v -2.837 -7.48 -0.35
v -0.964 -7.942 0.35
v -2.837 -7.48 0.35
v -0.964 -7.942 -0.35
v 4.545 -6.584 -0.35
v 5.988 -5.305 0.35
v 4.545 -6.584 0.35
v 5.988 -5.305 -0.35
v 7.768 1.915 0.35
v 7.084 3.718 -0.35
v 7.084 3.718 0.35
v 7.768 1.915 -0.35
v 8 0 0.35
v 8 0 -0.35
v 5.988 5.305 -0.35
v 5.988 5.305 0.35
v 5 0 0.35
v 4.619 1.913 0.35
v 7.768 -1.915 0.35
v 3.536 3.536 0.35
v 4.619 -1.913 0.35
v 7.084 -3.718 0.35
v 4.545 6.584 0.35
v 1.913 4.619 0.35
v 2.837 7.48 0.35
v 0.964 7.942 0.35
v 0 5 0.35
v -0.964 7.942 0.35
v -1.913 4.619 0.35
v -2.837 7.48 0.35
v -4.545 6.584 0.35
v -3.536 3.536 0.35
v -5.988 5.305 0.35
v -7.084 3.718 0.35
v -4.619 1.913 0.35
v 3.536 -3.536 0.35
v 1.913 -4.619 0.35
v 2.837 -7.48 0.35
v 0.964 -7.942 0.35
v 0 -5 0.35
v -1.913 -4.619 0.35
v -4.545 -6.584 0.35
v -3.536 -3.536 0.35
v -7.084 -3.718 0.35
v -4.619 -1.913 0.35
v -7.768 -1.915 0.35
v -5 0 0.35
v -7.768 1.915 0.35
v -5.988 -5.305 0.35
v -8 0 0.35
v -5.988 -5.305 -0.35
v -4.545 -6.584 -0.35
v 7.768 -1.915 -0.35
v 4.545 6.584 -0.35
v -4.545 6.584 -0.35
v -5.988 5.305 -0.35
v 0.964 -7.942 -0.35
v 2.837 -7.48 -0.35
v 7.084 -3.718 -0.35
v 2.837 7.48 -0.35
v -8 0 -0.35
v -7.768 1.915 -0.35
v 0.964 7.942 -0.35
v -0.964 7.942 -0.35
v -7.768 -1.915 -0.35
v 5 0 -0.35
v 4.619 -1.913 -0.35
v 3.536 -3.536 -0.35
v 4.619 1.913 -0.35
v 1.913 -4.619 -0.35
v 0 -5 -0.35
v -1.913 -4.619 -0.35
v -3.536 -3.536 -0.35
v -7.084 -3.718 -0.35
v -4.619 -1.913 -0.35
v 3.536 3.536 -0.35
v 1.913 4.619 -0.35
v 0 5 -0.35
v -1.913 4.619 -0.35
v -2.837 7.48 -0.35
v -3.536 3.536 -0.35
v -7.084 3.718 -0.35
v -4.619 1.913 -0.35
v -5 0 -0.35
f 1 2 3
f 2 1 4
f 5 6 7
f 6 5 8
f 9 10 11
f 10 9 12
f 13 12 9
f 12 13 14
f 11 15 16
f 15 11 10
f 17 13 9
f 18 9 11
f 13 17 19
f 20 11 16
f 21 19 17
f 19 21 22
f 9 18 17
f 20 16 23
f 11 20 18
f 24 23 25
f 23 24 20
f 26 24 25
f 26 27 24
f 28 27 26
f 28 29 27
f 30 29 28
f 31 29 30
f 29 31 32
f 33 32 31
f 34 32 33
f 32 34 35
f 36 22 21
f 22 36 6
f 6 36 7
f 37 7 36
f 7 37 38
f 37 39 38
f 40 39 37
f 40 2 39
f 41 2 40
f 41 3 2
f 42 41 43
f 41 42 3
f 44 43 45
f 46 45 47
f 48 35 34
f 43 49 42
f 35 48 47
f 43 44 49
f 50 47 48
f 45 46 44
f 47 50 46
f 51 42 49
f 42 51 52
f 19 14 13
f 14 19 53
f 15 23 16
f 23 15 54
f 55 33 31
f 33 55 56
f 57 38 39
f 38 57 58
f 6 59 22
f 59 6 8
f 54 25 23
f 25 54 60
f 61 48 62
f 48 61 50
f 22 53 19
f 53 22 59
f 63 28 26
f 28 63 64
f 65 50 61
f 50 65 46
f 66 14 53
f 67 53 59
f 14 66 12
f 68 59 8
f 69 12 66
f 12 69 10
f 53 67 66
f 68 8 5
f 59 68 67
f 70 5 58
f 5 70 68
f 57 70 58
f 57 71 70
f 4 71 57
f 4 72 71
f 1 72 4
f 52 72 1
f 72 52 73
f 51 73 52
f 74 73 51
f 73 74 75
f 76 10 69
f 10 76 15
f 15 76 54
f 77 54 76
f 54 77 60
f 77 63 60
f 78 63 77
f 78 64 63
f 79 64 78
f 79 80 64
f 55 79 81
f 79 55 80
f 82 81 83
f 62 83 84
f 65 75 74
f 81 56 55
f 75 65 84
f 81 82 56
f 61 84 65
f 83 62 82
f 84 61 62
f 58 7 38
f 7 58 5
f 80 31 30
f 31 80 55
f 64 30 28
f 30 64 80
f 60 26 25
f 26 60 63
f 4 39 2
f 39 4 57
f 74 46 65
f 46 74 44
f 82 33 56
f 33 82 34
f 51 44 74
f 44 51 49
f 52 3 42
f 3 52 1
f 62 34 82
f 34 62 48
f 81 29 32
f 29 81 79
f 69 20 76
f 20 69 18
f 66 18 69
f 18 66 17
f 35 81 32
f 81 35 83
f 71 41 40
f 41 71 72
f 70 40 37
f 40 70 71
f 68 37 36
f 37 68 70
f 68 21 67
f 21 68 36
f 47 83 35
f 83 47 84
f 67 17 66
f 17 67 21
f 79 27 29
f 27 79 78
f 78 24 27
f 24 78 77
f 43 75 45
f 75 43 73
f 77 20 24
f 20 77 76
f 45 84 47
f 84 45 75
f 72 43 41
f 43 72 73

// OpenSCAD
// Part A2: thin spacer ring.
// SPDX-License-Identifier: MIT
//
// Local origin convention:
// - XY origin is the ring axis.
// - Z origin is the part midplane.
// - Assembly placement and animation should be applied outside this file.

module part_a2(od = 16, id = 10, th = 0.7) {
    difference() {
        cylinder(d = od, h = th, center = true);
        cylinder(d = id, h = th + 0.2, center = true);
    }
}


// ---- "main guard" ----
// Default to previewing when opened directly:
if (is_undef(__LIB_MODE__)) {
    part_a2();
}
